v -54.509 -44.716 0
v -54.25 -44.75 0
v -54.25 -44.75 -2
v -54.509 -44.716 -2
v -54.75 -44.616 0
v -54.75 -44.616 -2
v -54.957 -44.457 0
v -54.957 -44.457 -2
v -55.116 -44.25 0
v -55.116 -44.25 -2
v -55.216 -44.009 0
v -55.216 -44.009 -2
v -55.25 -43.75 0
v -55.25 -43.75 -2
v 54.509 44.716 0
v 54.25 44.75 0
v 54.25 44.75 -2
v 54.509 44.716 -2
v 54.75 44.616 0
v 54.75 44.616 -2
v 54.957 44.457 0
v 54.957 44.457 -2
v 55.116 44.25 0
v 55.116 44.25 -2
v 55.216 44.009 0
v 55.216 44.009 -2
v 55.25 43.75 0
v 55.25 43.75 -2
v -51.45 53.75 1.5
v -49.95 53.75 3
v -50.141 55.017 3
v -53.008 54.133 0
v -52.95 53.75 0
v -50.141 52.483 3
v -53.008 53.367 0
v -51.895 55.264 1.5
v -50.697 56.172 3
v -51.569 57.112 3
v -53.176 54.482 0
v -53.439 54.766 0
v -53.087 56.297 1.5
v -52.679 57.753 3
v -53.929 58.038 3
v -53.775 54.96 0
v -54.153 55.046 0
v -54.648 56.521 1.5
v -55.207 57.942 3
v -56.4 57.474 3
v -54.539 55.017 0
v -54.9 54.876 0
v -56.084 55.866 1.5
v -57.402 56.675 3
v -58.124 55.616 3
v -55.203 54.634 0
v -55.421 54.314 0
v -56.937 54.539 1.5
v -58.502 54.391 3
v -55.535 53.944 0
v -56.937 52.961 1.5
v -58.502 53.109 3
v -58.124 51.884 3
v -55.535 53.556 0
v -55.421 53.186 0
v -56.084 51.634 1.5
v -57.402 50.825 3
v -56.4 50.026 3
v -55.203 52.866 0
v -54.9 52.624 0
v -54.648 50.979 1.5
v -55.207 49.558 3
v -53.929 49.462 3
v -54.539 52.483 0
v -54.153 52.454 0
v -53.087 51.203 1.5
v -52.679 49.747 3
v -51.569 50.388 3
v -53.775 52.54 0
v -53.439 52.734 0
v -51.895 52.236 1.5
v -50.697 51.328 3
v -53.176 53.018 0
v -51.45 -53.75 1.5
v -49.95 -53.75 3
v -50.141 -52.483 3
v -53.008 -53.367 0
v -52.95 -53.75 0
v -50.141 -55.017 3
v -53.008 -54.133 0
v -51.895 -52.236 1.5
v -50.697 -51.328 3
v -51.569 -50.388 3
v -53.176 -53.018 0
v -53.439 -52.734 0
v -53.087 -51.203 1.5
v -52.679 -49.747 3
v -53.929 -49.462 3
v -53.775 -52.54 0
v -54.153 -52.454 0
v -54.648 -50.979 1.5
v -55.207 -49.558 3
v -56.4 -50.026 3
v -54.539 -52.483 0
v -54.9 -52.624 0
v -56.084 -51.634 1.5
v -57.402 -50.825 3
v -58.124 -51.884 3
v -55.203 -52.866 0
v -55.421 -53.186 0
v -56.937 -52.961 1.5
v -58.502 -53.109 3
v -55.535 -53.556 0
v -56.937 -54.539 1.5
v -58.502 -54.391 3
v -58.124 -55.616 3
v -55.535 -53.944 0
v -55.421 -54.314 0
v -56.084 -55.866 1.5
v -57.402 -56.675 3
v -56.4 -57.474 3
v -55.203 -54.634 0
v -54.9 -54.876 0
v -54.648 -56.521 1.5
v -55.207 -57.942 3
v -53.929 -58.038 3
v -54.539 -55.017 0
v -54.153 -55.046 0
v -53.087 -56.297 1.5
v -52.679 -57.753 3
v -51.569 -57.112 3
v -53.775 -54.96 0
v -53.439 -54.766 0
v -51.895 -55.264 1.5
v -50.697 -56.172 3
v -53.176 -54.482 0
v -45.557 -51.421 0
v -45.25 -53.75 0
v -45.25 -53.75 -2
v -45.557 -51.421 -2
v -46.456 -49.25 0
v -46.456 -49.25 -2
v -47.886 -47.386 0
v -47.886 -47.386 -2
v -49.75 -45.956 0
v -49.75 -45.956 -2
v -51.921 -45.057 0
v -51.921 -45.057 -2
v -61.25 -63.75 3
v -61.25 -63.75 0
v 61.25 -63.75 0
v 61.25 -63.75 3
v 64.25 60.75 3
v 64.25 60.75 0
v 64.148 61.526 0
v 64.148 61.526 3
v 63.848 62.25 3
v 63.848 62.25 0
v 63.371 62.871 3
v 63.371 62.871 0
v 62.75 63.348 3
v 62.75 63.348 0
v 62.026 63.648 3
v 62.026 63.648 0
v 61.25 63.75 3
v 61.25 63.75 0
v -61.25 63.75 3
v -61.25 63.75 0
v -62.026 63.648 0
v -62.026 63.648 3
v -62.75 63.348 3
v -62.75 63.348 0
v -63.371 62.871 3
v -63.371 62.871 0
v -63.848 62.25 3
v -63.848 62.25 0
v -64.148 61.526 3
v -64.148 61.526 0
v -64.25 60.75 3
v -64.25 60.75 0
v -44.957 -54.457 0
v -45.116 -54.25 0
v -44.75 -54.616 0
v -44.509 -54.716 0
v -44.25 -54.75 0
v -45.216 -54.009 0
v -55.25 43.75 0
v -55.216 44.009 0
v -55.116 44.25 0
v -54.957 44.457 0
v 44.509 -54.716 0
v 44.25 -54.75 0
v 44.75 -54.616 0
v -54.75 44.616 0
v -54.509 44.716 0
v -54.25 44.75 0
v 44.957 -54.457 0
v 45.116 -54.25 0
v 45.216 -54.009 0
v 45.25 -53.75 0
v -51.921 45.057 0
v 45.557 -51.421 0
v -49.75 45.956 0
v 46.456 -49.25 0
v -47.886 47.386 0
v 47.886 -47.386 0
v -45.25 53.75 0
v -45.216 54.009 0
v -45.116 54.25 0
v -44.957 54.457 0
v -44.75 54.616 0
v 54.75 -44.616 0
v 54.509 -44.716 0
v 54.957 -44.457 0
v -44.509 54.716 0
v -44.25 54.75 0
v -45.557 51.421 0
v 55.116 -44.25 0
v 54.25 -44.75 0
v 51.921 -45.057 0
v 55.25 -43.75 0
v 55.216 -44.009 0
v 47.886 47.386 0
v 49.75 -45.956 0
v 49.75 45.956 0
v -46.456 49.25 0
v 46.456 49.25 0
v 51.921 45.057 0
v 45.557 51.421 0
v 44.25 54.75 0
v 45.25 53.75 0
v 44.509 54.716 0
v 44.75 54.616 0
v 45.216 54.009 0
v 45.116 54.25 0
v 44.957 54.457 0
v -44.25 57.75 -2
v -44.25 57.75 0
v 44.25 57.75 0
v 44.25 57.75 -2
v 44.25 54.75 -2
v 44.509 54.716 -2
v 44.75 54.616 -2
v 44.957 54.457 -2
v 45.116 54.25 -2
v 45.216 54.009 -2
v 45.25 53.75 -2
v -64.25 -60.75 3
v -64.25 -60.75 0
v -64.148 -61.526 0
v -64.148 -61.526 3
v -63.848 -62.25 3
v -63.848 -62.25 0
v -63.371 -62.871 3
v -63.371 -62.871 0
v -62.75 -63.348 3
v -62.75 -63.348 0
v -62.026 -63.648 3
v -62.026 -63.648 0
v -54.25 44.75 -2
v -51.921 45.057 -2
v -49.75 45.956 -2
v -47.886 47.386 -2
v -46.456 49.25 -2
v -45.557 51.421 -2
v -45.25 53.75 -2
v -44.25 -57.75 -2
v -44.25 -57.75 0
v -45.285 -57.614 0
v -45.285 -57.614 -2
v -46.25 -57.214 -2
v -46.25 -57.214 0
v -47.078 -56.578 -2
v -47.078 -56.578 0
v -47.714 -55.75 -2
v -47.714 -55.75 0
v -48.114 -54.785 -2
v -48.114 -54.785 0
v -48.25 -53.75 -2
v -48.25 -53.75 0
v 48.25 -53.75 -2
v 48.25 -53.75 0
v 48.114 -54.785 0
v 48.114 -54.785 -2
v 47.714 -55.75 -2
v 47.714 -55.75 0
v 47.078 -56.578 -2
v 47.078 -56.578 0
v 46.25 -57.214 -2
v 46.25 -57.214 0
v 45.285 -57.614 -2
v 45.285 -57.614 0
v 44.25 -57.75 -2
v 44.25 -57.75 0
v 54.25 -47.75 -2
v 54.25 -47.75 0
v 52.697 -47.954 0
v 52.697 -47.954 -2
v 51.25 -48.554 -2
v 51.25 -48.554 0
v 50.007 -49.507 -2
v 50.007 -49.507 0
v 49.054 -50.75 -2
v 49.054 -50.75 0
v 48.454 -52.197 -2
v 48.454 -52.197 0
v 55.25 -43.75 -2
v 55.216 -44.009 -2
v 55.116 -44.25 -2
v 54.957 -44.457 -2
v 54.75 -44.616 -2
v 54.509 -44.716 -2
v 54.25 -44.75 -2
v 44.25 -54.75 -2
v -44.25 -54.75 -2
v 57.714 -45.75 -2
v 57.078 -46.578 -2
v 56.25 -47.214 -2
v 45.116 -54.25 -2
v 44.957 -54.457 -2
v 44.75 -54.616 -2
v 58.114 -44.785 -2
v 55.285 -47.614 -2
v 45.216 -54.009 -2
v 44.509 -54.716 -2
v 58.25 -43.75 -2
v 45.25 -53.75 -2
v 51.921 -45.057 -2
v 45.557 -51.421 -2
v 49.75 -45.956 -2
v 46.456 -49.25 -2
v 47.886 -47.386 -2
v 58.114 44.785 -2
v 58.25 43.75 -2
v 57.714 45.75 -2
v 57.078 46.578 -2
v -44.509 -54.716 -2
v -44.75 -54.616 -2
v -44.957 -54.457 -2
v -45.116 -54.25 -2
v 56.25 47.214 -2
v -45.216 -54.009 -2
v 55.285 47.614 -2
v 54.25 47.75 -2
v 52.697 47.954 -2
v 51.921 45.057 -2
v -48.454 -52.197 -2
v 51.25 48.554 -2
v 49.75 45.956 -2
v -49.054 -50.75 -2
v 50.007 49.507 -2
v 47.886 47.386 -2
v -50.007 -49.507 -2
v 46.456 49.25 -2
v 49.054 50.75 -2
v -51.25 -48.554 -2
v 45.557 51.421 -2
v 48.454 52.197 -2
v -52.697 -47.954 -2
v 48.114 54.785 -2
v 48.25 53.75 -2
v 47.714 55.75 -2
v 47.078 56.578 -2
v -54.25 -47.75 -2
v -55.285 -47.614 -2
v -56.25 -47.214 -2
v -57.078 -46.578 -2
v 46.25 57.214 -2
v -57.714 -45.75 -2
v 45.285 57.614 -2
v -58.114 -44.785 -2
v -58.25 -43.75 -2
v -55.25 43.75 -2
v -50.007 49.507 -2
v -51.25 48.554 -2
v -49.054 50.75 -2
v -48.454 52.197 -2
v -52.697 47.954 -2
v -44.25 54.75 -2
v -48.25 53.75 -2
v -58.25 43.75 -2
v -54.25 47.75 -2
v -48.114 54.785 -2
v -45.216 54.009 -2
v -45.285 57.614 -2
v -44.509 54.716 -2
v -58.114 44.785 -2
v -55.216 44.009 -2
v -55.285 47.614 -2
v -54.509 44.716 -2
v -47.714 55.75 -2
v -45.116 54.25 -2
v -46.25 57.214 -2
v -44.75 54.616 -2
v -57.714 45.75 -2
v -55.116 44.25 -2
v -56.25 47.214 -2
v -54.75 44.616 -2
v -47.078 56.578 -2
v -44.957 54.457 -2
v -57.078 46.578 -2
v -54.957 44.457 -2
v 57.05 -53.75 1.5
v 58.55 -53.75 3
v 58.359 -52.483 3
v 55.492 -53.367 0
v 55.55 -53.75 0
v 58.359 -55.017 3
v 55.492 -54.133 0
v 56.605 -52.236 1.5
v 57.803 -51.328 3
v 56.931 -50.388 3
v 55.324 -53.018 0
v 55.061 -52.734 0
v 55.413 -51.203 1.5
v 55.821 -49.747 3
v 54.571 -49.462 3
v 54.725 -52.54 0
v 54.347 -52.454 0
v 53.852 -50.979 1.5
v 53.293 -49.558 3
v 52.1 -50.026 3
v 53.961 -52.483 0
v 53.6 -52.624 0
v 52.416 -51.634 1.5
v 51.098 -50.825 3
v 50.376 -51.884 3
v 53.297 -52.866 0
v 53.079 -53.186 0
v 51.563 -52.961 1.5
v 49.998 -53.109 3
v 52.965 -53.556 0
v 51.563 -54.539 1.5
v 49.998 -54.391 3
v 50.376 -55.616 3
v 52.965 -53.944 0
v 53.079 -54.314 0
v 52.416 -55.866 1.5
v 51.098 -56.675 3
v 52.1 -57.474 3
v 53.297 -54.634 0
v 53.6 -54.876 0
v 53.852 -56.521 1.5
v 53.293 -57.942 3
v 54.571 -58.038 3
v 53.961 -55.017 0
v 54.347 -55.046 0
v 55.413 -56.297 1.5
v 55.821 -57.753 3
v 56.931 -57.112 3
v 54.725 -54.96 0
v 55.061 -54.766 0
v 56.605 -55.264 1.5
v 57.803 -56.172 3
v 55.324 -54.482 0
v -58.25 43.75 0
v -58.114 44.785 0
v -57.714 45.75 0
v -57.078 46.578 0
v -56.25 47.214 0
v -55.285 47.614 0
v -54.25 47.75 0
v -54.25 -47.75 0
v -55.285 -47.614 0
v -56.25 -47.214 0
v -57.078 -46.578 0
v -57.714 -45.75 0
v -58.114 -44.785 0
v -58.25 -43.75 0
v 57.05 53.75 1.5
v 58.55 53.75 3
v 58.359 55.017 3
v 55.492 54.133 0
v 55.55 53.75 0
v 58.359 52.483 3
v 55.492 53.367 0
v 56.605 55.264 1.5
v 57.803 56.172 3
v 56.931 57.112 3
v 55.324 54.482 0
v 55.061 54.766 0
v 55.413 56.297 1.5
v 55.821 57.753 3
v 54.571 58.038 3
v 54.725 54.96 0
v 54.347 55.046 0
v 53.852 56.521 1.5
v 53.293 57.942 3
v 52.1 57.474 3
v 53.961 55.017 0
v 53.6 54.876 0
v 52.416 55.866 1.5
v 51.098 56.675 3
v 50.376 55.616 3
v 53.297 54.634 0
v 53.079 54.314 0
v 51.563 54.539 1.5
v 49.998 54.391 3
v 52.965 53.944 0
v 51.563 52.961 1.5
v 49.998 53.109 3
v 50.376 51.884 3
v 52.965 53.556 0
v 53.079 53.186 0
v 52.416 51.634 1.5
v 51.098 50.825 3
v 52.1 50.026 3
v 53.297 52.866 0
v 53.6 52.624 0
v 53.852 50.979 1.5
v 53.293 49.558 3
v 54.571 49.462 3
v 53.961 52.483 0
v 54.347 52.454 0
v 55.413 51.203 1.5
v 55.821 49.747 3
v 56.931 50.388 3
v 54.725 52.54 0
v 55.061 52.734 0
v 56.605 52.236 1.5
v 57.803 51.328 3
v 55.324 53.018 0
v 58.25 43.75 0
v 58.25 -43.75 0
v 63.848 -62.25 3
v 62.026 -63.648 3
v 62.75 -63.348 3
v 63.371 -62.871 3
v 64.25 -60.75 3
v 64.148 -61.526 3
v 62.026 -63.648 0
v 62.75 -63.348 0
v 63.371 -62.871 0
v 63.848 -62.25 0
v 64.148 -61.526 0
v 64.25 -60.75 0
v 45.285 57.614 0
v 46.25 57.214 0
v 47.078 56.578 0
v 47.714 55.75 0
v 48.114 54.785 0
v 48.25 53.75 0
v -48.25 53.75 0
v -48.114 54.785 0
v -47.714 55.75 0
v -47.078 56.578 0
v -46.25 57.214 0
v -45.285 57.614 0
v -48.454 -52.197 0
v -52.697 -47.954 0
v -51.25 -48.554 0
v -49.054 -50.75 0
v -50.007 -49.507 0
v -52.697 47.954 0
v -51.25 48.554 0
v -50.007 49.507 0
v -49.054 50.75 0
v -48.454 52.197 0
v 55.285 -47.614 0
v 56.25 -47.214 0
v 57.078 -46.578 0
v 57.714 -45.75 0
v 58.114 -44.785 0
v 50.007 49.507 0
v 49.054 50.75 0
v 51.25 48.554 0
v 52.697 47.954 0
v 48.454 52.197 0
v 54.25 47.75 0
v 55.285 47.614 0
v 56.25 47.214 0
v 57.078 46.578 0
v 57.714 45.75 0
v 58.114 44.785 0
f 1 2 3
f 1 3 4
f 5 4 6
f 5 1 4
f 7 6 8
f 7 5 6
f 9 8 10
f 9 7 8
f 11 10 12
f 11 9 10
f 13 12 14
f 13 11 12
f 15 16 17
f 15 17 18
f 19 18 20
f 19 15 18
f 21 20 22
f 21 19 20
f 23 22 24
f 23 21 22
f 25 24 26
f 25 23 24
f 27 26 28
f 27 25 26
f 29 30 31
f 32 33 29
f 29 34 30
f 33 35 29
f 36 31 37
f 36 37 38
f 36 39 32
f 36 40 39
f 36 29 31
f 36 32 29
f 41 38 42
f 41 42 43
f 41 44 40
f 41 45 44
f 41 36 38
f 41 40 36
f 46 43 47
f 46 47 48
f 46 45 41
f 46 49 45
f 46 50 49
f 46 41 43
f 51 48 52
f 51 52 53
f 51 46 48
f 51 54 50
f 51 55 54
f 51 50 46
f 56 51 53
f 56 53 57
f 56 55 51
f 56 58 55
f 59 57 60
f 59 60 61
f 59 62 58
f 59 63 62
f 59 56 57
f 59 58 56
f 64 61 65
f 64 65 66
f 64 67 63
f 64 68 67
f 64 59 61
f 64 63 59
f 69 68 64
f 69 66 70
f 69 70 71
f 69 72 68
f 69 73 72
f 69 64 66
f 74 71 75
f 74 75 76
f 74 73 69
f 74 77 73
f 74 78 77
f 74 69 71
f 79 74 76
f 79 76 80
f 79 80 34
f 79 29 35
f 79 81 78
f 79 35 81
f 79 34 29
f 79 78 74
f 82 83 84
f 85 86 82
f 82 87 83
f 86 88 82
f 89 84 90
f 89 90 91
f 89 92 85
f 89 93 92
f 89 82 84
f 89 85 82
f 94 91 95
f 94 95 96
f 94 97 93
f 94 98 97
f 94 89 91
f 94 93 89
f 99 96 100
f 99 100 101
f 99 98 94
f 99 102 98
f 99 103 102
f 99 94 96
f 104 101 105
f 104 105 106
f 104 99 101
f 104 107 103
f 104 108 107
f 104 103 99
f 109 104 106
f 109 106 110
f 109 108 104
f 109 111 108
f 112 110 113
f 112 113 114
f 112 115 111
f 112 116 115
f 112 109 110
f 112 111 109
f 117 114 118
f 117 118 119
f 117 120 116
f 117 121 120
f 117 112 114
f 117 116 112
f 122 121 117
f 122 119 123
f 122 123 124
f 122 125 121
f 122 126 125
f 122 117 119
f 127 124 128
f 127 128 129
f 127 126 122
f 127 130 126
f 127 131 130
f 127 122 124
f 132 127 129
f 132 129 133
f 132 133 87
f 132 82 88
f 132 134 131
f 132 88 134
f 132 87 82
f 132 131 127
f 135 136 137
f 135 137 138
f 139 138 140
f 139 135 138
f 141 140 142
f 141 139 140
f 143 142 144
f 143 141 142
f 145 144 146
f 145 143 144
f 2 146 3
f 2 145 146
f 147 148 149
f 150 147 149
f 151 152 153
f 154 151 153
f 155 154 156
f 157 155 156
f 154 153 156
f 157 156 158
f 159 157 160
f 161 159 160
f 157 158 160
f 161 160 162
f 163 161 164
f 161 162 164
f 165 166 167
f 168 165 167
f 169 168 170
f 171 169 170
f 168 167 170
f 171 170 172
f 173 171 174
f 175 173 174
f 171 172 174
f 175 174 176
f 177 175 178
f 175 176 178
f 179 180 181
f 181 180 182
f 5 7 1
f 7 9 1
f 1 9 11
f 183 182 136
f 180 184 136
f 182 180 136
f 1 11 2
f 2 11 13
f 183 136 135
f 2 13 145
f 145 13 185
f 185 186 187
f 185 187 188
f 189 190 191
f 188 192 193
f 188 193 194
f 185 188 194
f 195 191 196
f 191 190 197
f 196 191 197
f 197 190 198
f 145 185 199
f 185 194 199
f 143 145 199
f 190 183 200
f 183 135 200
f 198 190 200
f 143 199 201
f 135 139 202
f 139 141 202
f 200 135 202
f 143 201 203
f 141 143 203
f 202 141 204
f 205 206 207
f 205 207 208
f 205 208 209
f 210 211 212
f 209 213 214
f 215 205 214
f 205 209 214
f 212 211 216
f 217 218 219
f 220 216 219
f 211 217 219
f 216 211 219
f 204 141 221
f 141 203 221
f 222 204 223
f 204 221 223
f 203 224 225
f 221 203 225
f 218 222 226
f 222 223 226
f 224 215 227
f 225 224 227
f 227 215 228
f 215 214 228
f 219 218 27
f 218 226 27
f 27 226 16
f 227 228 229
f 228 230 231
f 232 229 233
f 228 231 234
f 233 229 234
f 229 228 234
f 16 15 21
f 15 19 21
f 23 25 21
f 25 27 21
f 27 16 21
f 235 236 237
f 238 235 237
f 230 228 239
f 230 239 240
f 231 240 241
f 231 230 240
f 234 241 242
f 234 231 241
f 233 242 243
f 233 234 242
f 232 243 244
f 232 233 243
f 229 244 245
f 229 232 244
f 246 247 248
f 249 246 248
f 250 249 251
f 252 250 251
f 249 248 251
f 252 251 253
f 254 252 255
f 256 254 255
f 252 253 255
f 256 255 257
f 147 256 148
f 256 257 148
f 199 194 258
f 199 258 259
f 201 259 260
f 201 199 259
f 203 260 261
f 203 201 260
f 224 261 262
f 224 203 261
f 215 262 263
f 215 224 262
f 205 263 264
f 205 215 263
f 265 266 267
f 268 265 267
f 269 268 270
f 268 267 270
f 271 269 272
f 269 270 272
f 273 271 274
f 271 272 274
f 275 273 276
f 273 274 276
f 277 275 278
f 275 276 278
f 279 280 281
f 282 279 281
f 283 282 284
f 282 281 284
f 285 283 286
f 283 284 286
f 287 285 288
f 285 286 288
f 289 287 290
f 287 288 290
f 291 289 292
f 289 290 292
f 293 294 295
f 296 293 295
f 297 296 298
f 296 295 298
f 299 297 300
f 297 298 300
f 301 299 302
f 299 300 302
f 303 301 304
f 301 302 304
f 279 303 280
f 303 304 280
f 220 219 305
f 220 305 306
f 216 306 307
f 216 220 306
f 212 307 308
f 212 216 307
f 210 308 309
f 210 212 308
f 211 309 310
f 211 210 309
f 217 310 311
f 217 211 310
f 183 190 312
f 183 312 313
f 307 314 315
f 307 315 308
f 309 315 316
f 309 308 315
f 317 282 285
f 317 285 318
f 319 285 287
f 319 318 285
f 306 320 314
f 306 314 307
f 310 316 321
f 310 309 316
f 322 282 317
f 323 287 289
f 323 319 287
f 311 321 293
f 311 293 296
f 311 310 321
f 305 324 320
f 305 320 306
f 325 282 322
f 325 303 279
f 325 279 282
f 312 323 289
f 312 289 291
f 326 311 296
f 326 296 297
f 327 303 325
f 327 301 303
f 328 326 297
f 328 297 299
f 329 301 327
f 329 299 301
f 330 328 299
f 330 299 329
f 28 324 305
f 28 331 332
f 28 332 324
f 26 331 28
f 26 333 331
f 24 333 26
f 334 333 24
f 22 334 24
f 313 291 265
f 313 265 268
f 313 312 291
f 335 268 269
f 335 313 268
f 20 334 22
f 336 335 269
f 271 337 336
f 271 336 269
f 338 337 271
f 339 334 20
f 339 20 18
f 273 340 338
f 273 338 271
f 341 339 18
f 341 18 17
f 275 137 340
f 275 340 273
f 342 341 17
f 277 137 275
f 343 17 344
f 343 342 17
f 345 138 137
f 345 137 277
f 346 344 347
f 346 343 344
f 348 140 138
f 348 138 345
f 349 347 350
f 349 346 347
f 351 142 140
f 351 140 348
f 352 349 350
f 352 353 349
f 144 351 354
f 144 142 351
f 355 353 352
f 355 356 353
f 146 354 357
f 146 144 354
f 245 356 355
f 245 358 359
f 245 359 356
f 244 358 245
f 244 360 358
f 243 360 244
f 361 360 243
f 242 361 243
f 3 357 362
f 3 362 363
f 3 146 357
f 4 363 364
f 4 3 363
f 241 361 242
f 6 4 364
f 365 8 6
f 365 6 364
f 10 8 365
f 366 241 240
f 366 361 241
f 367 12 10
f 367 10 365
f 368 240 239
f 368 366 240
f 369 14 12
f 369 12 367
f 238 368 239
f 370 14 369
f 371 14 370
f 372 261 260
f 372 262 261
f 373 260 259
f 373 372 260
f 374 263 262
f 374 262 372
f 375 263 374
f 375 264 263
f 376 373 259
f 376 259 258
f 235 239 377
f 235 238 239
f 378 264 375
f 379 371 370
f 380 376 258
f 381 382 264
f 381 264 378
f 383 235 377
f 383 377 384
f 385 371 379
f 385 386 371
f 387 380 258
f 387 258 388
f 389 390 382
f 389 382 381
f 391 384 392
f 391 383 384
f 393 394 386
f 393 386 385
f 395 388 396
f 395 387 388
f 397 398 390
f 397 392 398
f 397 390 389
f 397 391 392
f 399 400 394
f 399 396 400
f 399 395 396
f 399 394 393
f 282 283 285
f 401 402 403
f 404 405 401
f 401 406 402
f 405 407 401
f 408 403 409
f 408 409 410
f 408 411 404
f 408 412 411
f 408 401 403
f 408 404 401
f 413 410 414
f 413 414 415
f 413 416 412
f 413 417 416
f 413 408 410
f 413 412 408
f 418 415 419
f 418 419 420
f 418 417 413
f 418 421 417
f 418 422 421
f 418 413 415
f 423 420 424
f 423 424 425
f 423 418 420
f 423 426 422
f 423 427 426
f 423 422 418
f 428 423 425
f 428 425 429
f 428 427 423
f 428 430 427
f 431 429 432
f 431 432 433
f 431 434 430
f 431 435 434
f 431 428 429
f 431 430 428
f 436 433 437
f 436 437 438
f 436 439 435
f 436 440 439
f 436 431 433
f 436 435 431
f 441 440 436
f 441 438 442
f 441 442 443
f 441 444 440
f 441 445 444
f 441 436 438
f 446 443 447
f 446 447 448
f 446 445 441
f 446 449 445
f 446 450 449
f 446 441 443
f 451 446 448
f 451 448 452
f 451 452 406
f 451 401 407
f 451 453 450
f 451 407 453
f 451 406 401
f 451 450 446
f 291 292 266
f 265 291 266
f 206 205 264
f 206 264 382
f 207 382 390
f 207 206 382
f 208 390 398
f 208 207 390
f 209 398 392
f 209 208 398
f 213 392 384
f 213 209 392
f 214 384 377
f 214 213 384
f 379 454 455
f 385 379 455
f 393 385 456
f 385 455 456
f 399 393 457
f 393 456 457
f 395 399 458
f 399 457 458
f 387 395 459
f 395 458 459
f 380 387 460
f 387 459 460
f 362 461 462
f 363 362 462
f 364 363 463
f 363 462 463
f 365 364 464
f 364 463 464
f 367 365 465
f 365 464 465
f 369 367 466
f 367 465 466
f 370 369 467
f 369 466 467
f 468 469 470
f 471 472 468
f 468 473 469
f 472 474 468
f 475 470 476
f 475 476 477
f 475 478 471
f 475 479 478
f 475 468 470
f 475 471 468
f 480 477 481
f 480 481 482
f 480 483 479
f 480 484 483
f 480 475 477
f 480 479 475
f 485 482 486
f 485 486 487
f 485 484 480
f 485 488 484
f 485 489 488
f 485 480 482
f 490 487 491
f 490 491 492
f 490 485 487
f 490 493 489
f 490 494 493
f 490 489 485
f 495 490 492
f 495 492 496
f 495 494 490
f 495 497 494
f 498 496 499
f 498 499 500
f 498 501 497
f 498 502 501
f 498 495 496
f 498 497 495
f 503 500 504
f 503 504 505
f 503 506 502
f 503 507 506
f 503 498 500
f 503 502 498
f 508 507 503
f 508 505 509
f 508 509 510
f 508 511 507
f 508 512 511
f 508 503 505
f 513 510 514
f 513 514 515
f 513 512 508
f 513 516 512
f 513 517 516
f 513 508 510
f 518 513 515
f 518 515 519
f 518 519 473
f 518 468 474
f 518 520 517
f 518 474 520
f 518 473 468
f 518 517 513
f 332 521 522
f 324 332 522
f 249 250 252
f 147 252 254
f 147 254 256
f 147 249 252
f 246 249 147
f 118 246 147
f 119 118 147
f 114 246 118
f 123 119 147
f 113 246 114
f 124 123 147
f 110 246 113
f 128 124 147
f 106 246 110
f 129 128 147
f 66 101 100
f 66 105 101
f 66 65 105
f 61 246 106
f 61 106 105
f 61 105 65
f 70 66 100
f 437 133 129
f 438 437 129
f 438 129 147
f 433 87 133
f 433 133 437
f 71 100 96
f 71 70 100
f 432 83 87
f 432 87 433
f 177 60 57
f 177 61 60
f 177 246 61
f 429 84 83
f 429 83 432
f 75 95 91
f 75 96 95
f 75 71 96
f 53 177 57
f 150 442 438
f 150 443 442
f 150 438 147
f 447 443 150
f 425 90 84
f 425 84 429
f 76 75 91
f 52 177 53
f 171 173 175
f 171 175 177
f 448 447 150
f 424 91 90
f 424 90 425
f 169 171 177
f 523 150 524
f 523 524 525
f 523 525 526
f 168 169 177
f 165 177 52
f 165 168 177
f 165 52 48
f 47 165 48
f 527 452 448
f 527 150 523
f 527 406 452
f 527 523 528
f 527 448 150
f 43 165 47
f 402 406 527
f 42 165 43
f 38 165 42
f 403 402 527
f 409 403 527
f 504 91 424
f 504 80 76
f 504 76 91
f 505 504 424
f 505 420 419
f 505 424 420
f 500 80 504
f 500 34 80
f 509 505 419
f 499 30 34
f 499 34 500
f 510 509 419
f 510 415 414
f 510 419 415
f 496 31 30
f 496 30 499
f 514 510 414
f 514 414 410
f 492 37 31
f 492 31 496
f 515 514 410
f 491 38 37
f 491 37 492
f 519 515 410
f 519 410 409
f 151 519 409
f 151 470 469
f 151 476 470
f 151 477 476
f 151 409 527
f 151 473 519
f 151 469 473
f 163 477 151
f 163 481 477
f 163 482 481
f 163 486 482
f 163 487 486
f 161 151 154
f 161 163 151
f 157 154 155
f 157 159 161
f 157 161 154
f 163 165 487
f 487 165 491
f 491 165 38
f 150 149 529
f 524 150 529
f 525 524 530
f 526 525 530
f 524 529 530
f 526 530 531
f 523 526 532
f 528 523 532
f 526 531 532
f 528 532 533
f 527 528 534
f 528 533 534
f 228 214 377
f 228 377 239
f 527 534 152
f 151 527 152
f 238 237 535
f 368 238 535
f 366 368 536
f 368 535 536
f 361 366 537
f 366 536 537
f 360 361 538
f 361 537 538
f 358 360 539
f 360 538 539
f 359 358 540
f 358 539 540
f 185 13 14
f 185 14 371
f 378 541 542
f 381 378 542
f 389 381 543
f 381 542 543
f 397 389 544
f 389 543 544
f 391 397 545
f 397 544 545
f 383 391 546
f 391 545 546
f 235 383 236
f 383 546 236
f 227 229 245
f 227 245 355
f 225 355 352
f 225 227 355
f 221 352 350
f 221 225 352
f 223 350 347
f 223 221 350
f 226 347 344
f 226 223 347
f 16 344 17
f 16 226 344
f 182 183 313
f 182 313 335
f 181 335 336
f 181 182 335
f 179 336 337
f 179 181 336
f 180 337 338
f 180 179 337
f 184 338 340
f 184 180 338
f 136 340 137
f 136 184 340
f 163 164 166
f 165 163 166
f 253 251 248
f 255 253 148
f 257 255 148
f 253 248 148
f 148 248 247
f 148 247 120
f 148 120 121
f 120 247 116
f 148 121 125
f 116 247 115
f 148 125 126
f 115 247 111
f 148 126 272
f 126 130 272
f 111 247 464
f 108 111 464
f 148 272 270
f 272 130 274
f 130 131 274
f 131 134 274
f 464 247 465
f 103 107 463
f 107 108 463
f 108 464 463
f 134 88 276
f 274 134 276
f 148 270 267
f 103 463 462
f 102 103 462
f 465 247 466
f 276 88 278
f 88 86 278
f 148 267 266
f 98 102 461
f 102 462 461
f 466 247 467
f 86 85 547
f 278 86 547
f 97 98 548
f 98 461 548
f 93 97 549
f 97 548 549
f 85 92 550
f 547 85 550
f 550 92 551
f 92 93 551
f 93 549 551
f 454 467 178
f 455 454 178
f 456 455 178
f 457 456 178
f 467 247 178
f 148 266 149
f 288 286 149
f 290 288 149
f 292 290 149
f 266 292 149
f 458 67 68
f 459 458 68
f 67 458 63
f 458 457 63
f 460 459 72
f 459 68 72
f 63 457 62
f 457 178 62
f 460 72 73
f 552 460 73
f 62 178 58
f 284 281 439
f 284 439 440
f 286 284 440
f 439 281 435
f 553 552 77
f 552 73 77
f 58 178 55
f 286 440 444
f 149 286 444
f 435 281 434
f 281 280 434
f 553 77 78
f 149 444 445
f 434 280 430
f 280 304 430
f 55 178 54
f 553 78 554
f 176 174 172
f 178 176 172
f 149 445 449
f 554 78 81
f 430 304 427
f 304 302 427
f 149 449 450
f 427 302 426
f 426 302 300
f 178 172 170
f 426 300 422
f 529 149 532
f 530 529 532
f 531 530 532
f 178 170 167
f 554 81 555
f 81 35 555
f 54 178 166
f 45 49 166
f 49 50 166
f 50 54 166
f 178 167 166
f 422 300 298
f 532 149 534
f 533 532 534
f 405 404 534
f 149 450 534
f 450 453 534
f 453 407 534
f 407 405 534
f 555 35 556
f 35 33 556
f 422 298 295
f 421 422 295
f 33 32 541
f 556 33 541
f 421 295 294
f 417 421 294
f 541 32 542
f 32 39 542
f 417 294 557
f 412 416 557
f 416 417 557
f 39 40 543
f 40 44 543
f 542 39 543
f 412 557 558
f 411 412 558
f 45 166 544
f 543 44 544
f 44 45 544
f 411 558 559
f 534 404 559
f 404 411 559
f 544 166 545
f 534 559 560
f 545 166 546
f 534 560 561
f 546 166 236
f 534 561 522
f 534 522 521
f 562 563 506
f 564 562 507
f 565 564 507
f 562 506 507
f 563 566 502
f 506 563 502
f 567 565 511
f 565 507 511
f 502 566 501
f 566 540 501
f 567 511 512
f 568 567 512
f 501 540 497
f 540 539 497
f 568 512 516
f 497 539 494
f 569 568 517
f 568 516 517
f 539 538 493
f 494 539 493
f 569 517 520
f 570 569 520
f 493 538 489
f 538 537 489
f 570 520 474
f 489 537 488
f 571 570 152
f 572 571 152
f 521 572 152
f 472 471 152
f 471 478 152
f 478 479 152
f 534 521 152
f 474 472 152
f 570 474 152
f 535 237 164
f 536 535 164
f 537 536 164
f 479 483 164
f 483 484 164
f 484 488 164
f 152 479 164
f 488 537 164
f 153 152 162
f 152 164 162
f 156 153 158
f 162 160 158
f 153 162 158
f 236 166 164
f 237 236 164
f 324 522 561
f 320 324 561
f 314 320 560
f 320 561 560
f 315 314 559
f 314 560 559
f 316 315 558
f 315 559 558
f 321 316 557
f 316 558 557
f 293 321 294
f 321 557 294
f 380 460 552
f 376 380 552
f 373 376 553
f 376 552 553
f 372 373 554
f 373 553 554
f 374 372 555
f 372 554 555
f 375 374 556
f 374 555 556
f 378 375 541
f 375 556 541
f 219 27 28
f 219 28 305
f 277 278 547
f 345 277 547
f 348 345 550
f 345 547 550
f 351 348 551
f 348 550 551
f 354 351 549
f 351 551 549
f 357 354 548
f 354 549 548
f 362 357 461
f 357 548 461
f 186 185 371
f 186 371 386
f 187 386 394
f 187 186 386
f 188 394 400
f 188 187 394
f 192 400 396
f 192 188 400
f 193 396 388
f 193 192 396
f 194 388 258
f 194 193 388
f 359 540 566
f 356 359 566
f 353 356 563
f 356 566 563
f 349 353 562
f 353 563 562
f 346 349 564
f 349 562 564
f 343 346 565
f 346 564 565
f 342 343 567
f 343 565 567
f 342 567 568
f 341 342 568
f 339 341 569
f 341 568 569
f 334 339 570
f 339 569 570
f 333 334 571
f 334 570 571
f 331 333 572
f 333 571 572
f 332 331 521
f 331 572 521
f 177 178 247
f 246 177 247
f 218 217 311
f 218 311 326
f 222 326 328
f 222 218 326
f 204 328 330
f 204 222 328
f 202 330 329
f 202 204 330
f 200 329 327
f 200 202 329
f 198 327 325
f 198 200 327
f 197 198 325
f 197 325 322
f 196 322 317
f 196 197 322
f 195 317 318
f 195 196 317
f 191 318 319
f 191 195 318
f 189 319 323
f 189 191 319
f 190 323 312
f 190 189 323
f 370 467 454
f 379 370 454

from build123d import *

# Parameters (mm, degrees)
EXTRUDE_1_DEPTH     = 3
EXTRUDE_1_2_DEPTH   = 2
SKETCH_3_R          = 1.3
CUT_EXTRUDE_1_DEPTH = 5
CHAMFER_1_SIZE      = 3


with BuildPart() as part:
    # Эскиз1 → Extrude 1 (new body)
    with BuildSketch(Plane.XY):
        with BuildLine():
            Line((-64.25, 60.75), (-64.25, -60.75))
            ThreePointArc((-64.25, -60.75), (-63.371320344, -62.871320344), (-61.25, -63.75))
            Line((-61.25, -63.75), (61.25, -63.75))
            ThreePointArc((61.25, -63.75), (63.371320344, -62.871320344), (64.25, -60.75))
            Line((64.25, -60.75), (64.25, 60.75))
            ThreePointArc((64.25, 60.75), (63.371320344, 62.871320344), (61.25, 63.75))
            Line((61.25, 63.75), (-61.25, 63.75))
            ThreePointArc((-61.25, 63.75), (-63.371320344, 62.871320344), (-64.25, 60.75))
        make_face()
    extrude(amount=EXTRUDE_1_DEPTH)

    # Эскиз2 → Extrude 1 2 (add)
    with BuildSketch(Plane(origin=(0, 0, 0), x_dir=(-1, 0, 0), z_dir=(0, 0, -1))):
        with BuildLine():
            Line((-44.25, -57.75), (44.25, -57.75))
            ThreePointArc((44.25, -57.75), (47.078427125, -56.578427125), (48.25, -53.75))
            ThreePointArc((48.25, -53.75), (50.007359313, -49.507359313), (54.25, -47.75))
            ThreePointArc((54.25, -47.75), (57.078427125, -46.578427125), (58.25, -43.75))
            Line((58.25, -43.75), (58.25, 43.75))
            ThreePointArc((58.25, 43.75), (57.078427125, 46.578427125), (54.25, 47.75))
            ThreePointArc((54.25, 47.75), (50.007359313, 49.507359313), (48.25, 53.75))
            ThreePointArc((48.25, 53.75), (47.078427125, 56.578427125), (44.25, 57.75))
            Line((44.25, 57.75), (-44.25, 57.75))
            ThreePointArc((-44.25, 57.75), (-47.078427125, 56.578427125), (-48.25, 53.75))
            ThreePointArc((-48.25, 53.75), (-50.007359313, 49.507359313), (-54.25, 47.75))
            ThreePointArc((-54.25, 47.75), (-57.078427125, 46.578427125), (-58.25, 43.75))
            Line((-58.25, 43.75), (-58.25, -43.75))
            ThreePointArc((-58.25, -43.75), (-57.078427125, -46.578427125), (-54.25, -47.75))
            ThreePointArc((-54.25, -47.75), (-50.007359313, -49.507359313), (-48.25, -53.75))
            ThreePointArc((-48.25, -53.75), (-47.078427125, -56.578427125), (-44.25, -57.75))
        make_face()
        with BuildLine():
            Line((-44.25, -54.75), (44.25, -54.75))
            ThreePointArc((44.25, -54.75), (44.957106781, -54.457106781), (45.25, -53.75))
            ThreePointArc((45.25, -53.75), (47.886038969, -47.386038969), (54.25, -44.75))
            ThreePointArc((54.25, -44.75), (54.957106781, -44.457106781), (55.25, -43.75))
            Line((55.25, -43.75), (55.25, 43.75))
            ThreePointArc((55.25, 43.75), (54.957106781, 44.457106781), (54.25, 44.75))
            ThreePointArc((54.25, 44.75), (47.886038969, 47.386038969), (45.25, 53.75))
            ThreePointArc((45.25, 53.75), (44.957106781, 54.457106781), (44.25, 54.75))
            Line((44.25, 54.75), (-44.25, 54.75))
            ThreePointArc((-44.25, 54.75), (-44.957106781, 54.457106781), (-45.25, 53.75))
            ThreePointArc((-45.25, 53.75), (-47.886038969, 47.386038969), (-54.25, 44.75))
            ThreePointArc((-54.25, 44.75), (-54.957106781, 44.457106781), (-55.25, 43.75))
            Line((-55.25, 43.75), (-55.25, -43.75))
            ThreePointArc((-55.25, -43.75), (-54.957106781, -44.457106781), (-54.25, -44.75))
            ThreePointArc((-54.25, -44.75), (-47.886038969, -47.386038969), (-45.25, -53.75))
            ThreePointArc((-45.25, -53.75), (-44.957106781, -54.457106781), (-44.25, -54.75))
        make_face(mode=Mode.SUBTRACT)
    extrude(amount=EXTRUDE_1_2_DEPTH)

    # Эскиз3 → Вырез-Вытянуть1 (cut)
    with BuildSketch(Plane.XY.offset(3)):
        with Locations((54.25, -53.75)):
            Circle(SKETCH_3_R)
        with Locations((54.25, 53.75)):
            Circle(SKETCH_3_R)
        with Locations((-54.25, 53.75)):
            Circle(SKETCH_3_R)
        with Locations((-54.25, -53.75)):
            Circle(SKETCH_3_R)
    extrude(amount=-CUT_EXTRUDE_1_DEPTH, mode=Mode.SUBTRACT)

    # Фаска1
    chamfer_1_edges = [part.edges().sort_by_distance(p)[0] for p in [
        (-55.55, -53.75, 3),
        (-55.55, 53.75, 3),
        (52.95, 53.75, 3),
        (52.95, -53.75, 3),
    ]]
    chamfer(chamfer_1_edges, length=CHAMFER_1_SIZE - 0.0001)  # a hair under: the kernel refuses the full size


solid = part.part
